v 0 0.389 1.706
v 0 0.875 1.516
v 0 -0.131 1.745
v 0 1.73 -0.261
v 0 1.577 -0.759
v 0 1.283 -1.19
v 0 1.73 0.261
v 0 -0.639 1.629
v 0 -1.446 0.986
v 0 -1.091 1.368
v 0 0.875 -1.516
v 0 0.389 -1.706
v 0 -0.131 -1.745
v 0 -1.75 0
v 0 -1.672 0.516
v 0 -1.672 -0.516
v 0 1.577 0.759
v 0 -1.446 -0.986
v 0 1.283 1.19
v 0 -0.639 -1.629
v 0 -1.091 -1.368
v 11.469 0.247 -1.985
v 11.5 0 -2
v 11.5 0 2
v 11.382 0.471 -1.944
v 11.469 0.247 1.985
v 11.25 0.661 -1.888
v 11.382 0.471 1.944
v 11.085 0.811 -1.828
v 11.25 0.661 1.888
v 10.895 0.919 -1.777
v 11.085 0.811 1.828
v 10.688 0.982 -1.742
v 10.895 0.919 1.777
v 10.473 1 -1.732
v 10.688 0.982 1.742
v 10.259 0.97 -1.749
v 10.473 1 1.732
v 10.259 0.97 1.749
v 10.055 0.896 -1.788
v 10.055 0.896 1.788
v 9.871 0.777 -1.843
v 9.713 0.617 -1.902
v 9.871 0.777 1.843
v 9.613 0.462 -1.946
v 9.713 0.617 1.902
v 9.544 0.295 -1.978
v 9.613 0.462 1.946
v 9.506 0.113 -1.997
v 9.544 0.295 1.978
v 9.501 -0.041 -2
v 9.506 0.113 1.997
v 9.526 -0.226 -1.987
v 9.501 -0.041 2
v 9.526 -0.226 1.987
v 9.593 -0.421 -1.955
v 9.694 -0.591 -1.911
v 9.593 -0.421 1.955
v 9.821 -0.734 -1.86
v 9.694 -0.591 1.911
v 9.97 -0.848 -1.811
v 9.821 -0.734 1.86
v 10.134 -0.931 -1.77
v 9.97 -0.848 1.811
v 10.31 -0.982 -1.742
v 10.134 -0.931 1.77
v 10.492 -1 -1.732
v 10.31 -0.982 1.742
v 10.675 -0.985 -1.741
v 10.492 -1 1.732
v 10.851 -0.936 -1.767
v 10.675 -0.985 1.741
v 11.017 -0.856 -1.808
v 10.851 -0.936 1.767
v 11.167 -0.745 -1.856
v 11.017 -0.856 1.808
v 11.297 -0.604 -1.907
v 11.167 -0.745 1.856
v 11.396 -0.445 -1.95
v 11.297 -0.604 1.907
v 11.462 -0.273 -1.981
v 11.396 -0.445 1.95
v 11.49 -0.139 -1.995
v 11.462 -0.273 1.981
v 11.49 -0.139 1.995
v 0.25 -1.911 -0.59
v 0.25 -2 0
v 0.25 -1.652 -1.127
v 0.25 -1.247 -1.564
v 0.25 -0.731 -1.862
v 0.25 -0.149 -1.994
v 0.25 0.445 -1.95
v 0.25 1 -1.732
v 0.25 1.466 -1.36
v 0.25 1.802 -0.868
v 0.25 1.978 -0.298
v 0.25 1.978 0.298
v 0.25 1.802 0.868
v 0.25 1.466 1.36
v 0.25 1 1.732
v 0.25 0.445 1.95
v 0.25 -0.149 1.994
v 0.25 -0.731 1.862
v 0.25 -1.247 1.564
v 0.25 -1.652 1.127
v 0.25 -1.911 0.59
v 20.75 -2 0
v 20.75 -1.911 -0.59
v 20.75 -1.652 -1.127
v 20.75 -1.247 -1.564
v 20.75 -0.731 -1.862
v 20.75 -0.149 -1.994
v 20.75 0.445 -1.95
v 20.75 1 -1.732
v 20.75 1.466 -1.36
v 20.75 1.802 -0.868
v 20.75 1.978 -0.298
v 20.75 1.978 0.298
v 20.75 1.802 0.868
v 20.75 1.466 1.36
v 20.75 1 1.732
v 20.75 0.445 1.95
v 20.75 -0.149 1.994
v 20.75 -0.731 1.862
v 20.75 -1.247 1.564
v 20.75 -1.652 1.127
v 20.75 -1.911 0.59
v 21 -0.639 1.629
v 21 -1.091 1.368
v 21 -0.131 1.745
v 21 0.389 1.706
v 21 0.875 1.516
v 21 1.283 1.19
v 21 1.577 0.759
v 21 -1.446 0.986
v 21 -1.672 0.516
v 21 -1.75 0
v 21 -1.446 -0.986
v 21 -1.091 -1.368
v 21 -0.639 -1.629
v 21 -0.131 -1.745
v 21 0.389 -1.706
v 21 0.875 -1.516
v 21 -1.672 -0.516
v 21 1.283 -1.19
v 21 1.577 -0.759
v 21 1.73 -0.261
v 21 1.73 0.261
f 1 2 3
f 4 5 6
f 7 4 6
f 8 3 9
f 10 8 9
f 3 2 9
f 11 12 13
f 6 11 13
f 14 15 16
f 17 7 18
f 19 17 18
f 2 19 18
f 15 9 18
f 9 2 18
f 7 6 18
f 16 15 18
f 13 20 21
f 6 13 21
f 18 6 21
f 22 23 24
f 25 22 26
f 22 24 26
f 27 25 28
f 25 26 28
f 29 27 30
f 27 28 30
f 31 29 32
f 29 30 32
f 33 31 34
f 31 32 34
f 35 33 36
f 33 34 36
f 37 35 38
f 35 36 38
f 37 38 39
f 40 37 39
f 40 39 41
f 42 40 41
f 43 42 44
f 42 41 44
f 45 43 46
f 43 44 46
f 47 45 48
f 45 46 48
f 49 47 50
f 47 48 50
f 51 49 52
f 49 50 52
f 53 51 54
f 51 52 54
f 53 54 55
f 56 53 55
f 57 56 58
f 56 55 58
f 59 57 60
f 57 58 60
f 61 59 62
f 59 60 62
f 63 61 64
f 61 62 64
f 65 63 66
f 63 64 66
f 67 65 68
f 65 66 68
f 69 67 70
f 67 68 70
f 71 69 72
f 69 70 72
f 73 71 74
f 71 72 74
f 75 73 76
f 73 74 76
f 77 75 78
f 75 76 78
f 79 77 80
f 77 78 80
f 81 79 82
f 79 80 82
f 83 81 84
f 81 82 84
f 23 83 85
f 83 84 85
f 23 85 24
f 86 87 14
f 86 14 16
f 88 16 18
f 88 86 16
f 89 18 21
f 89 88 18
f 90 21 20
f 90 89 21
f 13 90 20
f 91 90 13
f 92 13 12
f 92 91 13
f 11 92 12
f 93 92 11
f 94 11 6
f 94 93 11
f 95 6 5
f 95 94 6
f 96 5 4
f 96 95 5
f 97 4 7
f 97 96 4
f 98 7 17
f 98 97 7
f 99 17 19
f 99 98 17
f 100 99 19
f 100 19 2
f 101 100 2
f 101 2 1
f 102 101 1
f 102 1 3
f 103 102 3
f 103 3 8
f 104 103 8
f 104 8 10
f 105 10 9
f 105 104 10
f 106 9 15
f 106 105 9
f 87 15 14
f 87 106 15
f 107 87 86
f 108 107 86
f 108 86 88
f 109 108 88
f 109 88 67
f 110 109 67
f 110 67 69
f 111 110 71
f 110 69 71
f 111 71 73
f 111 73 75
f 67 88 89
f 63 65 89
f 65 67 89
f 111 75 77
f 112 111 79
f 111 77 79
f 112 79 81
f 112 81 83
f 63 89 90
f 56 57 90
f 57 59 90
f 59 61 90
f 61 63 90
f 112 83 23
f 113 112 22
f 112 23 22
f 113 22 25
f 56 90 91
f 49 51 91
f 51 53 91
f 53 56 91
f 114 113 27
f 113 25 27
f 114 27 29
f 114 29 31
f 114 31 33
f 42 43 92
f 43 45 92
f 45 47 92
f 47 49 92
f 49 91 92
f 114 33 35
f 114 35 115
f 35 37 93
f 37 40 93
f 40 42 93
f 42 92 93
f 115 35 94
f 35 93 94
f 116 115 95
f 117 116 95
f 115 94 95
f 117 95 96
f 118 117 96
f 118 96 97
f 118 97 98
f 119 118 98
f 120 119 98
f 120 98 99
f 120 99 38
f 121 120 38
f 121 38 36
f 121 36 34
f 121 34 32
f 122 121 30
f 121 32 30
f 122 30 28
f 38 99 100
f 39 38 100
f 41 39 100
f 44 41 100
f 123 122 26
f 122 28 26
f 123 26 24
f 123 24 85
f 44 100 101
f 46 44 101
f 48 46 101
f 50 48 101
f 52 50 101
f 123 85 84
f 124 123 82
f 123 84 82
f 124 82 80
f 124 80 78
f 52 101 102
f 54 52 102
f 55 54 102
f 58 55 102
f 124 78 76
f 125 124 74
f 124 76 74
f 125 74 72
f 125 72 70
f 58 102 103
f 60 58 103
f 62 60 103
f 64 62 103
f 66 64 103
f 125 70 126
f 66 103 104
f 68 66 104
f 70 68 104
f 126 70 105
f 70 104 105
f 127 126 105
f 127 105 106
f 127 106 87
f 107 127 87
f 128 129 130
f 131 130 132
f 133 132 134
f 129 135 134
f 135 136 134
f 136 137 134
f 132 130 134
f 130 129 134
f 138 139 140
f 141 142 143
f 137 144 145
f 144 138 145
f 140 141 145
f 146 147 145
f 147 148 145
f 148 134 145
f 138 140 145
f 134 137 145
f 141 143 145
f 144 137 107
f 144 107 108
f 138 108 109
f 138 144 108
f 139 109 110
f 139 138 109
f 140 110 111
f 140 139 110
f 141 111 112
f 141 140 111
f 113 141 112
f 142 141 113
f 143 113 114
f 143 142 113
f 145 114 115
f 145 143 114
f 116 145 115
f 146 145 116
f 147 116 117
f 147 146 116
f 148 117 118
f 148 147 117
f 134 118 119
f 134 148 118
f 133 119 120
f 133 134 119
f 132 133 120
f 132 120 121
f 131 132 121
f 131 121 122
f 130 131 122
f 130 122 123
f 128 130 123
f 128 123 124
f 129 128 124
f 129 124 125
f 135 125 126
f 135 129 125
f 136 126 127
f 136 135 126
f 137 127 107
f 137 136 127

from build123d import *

# Parameters (mm, degrees)
CUT_EXTRUDE_START   = -3.5
CUT_EXTRUDE_1_DEPTH = 10
SKETCH_3_W          = 4
SKETCH_3_H          = 19.670556204
CUT_EXTRUDE_2_DEPTH = 10
CUT_EXTRUDE_START_2 = -29
SKETCH_4_R          = 4
SKETCH_4_R_2        = 2
CUT_EXTRUDE_3_DEPTH = 29
SKETCH_5_R          = 1
CUT_EXTRUDE_4_DEPTH = 5
CHAMFER_1_SIZE      = 0.25


with BuildPart() as part:
    # 草图1 → 旋转2 (revolve)
    with BuildSketch(Plane.XY, mode=Mode.PRIVATE) as revolve_2_sk:
        Polygon((0, 2), (0, 0), (17, 0), (21, 0), (21, 2), (17, 2), (17, 4), (4, 4), (4, 2), align=None)
    revolve(revolve_2_sk.sketch.rotate(Axis((-16.701754386, 0, 0), (1, 0, 0)), 180), axis=Axis((-16.701754386, 0, 0), (1, 0, 0)))

    # 草图2 → 切除-拉伸1 (cut)
    with BuildSketch(Plane.XY.offset(CUT_EXTRUDE_START)):
        Polygon((12.5, -5.827233832), (12.5, 4), (10.5, 4), (8.5, 4), (8.5, -5.827233832), align=None)
    extrude(amount=-CUT_EXTRUDE_1_DEPTH, mode=Mode.SUBTRACT)

    # 草图3 → 切除-拉伸2 (cut)
    with BuildSketch(Plane(origin=(0, 0, 0), x_dir=(1, 0, 0), z_dir=(0, 1, 0)).offset(CUT_EXTRUDE_START)):
        with Locations((10.5, 3.5)):
            Rectangle(SKETCH_3_W, SKETCH_3_H)
    extrude(amount=-CUT_EXTRUDE_2_DEPTH, mode=Mode.SUBTRACT)

    # 草图4 → 切除-拉伸3 (cut)
    with BuildSketch(Plane(origin=(21, 0, 0), x_dir=(0, 0, -1), z_dir=(1, 0, 0)).offset(CUT_EXTRUDE_START_2)):
        Circle(SKETCH_4_R)
        with Locations(Location((0, 0, 0), (0, 0, 270))):
            Circle(SKETCH_4_R_2, mode=Mode.SUBTRACT)
    extrude(amount=CUT_EXTRUDE_3_DEPTH, mode=Mode.SUBTRACT)

    # 草图5 → 切除-拉伸4 (cut, symmetric)
    with BuildSketch(Plane.XY):
        with Locations((10.5, 0)):
            Circle(SKETCH_5_R)
    extrude(amount=CUT_EXTRUDE_4_DEPTH, both=True, mode=Mode.SUBTRACT)

    # 倒角1
    chamfer_1_edges = [part.edges().sort_by_distance(p)[0] for p in [
        (0, 2, 0),
        (21, 2, 0),
    ]]
    chamfer(chamfer_1_edges, length=CHAMFER_1_SIZE)


solid = part.part
